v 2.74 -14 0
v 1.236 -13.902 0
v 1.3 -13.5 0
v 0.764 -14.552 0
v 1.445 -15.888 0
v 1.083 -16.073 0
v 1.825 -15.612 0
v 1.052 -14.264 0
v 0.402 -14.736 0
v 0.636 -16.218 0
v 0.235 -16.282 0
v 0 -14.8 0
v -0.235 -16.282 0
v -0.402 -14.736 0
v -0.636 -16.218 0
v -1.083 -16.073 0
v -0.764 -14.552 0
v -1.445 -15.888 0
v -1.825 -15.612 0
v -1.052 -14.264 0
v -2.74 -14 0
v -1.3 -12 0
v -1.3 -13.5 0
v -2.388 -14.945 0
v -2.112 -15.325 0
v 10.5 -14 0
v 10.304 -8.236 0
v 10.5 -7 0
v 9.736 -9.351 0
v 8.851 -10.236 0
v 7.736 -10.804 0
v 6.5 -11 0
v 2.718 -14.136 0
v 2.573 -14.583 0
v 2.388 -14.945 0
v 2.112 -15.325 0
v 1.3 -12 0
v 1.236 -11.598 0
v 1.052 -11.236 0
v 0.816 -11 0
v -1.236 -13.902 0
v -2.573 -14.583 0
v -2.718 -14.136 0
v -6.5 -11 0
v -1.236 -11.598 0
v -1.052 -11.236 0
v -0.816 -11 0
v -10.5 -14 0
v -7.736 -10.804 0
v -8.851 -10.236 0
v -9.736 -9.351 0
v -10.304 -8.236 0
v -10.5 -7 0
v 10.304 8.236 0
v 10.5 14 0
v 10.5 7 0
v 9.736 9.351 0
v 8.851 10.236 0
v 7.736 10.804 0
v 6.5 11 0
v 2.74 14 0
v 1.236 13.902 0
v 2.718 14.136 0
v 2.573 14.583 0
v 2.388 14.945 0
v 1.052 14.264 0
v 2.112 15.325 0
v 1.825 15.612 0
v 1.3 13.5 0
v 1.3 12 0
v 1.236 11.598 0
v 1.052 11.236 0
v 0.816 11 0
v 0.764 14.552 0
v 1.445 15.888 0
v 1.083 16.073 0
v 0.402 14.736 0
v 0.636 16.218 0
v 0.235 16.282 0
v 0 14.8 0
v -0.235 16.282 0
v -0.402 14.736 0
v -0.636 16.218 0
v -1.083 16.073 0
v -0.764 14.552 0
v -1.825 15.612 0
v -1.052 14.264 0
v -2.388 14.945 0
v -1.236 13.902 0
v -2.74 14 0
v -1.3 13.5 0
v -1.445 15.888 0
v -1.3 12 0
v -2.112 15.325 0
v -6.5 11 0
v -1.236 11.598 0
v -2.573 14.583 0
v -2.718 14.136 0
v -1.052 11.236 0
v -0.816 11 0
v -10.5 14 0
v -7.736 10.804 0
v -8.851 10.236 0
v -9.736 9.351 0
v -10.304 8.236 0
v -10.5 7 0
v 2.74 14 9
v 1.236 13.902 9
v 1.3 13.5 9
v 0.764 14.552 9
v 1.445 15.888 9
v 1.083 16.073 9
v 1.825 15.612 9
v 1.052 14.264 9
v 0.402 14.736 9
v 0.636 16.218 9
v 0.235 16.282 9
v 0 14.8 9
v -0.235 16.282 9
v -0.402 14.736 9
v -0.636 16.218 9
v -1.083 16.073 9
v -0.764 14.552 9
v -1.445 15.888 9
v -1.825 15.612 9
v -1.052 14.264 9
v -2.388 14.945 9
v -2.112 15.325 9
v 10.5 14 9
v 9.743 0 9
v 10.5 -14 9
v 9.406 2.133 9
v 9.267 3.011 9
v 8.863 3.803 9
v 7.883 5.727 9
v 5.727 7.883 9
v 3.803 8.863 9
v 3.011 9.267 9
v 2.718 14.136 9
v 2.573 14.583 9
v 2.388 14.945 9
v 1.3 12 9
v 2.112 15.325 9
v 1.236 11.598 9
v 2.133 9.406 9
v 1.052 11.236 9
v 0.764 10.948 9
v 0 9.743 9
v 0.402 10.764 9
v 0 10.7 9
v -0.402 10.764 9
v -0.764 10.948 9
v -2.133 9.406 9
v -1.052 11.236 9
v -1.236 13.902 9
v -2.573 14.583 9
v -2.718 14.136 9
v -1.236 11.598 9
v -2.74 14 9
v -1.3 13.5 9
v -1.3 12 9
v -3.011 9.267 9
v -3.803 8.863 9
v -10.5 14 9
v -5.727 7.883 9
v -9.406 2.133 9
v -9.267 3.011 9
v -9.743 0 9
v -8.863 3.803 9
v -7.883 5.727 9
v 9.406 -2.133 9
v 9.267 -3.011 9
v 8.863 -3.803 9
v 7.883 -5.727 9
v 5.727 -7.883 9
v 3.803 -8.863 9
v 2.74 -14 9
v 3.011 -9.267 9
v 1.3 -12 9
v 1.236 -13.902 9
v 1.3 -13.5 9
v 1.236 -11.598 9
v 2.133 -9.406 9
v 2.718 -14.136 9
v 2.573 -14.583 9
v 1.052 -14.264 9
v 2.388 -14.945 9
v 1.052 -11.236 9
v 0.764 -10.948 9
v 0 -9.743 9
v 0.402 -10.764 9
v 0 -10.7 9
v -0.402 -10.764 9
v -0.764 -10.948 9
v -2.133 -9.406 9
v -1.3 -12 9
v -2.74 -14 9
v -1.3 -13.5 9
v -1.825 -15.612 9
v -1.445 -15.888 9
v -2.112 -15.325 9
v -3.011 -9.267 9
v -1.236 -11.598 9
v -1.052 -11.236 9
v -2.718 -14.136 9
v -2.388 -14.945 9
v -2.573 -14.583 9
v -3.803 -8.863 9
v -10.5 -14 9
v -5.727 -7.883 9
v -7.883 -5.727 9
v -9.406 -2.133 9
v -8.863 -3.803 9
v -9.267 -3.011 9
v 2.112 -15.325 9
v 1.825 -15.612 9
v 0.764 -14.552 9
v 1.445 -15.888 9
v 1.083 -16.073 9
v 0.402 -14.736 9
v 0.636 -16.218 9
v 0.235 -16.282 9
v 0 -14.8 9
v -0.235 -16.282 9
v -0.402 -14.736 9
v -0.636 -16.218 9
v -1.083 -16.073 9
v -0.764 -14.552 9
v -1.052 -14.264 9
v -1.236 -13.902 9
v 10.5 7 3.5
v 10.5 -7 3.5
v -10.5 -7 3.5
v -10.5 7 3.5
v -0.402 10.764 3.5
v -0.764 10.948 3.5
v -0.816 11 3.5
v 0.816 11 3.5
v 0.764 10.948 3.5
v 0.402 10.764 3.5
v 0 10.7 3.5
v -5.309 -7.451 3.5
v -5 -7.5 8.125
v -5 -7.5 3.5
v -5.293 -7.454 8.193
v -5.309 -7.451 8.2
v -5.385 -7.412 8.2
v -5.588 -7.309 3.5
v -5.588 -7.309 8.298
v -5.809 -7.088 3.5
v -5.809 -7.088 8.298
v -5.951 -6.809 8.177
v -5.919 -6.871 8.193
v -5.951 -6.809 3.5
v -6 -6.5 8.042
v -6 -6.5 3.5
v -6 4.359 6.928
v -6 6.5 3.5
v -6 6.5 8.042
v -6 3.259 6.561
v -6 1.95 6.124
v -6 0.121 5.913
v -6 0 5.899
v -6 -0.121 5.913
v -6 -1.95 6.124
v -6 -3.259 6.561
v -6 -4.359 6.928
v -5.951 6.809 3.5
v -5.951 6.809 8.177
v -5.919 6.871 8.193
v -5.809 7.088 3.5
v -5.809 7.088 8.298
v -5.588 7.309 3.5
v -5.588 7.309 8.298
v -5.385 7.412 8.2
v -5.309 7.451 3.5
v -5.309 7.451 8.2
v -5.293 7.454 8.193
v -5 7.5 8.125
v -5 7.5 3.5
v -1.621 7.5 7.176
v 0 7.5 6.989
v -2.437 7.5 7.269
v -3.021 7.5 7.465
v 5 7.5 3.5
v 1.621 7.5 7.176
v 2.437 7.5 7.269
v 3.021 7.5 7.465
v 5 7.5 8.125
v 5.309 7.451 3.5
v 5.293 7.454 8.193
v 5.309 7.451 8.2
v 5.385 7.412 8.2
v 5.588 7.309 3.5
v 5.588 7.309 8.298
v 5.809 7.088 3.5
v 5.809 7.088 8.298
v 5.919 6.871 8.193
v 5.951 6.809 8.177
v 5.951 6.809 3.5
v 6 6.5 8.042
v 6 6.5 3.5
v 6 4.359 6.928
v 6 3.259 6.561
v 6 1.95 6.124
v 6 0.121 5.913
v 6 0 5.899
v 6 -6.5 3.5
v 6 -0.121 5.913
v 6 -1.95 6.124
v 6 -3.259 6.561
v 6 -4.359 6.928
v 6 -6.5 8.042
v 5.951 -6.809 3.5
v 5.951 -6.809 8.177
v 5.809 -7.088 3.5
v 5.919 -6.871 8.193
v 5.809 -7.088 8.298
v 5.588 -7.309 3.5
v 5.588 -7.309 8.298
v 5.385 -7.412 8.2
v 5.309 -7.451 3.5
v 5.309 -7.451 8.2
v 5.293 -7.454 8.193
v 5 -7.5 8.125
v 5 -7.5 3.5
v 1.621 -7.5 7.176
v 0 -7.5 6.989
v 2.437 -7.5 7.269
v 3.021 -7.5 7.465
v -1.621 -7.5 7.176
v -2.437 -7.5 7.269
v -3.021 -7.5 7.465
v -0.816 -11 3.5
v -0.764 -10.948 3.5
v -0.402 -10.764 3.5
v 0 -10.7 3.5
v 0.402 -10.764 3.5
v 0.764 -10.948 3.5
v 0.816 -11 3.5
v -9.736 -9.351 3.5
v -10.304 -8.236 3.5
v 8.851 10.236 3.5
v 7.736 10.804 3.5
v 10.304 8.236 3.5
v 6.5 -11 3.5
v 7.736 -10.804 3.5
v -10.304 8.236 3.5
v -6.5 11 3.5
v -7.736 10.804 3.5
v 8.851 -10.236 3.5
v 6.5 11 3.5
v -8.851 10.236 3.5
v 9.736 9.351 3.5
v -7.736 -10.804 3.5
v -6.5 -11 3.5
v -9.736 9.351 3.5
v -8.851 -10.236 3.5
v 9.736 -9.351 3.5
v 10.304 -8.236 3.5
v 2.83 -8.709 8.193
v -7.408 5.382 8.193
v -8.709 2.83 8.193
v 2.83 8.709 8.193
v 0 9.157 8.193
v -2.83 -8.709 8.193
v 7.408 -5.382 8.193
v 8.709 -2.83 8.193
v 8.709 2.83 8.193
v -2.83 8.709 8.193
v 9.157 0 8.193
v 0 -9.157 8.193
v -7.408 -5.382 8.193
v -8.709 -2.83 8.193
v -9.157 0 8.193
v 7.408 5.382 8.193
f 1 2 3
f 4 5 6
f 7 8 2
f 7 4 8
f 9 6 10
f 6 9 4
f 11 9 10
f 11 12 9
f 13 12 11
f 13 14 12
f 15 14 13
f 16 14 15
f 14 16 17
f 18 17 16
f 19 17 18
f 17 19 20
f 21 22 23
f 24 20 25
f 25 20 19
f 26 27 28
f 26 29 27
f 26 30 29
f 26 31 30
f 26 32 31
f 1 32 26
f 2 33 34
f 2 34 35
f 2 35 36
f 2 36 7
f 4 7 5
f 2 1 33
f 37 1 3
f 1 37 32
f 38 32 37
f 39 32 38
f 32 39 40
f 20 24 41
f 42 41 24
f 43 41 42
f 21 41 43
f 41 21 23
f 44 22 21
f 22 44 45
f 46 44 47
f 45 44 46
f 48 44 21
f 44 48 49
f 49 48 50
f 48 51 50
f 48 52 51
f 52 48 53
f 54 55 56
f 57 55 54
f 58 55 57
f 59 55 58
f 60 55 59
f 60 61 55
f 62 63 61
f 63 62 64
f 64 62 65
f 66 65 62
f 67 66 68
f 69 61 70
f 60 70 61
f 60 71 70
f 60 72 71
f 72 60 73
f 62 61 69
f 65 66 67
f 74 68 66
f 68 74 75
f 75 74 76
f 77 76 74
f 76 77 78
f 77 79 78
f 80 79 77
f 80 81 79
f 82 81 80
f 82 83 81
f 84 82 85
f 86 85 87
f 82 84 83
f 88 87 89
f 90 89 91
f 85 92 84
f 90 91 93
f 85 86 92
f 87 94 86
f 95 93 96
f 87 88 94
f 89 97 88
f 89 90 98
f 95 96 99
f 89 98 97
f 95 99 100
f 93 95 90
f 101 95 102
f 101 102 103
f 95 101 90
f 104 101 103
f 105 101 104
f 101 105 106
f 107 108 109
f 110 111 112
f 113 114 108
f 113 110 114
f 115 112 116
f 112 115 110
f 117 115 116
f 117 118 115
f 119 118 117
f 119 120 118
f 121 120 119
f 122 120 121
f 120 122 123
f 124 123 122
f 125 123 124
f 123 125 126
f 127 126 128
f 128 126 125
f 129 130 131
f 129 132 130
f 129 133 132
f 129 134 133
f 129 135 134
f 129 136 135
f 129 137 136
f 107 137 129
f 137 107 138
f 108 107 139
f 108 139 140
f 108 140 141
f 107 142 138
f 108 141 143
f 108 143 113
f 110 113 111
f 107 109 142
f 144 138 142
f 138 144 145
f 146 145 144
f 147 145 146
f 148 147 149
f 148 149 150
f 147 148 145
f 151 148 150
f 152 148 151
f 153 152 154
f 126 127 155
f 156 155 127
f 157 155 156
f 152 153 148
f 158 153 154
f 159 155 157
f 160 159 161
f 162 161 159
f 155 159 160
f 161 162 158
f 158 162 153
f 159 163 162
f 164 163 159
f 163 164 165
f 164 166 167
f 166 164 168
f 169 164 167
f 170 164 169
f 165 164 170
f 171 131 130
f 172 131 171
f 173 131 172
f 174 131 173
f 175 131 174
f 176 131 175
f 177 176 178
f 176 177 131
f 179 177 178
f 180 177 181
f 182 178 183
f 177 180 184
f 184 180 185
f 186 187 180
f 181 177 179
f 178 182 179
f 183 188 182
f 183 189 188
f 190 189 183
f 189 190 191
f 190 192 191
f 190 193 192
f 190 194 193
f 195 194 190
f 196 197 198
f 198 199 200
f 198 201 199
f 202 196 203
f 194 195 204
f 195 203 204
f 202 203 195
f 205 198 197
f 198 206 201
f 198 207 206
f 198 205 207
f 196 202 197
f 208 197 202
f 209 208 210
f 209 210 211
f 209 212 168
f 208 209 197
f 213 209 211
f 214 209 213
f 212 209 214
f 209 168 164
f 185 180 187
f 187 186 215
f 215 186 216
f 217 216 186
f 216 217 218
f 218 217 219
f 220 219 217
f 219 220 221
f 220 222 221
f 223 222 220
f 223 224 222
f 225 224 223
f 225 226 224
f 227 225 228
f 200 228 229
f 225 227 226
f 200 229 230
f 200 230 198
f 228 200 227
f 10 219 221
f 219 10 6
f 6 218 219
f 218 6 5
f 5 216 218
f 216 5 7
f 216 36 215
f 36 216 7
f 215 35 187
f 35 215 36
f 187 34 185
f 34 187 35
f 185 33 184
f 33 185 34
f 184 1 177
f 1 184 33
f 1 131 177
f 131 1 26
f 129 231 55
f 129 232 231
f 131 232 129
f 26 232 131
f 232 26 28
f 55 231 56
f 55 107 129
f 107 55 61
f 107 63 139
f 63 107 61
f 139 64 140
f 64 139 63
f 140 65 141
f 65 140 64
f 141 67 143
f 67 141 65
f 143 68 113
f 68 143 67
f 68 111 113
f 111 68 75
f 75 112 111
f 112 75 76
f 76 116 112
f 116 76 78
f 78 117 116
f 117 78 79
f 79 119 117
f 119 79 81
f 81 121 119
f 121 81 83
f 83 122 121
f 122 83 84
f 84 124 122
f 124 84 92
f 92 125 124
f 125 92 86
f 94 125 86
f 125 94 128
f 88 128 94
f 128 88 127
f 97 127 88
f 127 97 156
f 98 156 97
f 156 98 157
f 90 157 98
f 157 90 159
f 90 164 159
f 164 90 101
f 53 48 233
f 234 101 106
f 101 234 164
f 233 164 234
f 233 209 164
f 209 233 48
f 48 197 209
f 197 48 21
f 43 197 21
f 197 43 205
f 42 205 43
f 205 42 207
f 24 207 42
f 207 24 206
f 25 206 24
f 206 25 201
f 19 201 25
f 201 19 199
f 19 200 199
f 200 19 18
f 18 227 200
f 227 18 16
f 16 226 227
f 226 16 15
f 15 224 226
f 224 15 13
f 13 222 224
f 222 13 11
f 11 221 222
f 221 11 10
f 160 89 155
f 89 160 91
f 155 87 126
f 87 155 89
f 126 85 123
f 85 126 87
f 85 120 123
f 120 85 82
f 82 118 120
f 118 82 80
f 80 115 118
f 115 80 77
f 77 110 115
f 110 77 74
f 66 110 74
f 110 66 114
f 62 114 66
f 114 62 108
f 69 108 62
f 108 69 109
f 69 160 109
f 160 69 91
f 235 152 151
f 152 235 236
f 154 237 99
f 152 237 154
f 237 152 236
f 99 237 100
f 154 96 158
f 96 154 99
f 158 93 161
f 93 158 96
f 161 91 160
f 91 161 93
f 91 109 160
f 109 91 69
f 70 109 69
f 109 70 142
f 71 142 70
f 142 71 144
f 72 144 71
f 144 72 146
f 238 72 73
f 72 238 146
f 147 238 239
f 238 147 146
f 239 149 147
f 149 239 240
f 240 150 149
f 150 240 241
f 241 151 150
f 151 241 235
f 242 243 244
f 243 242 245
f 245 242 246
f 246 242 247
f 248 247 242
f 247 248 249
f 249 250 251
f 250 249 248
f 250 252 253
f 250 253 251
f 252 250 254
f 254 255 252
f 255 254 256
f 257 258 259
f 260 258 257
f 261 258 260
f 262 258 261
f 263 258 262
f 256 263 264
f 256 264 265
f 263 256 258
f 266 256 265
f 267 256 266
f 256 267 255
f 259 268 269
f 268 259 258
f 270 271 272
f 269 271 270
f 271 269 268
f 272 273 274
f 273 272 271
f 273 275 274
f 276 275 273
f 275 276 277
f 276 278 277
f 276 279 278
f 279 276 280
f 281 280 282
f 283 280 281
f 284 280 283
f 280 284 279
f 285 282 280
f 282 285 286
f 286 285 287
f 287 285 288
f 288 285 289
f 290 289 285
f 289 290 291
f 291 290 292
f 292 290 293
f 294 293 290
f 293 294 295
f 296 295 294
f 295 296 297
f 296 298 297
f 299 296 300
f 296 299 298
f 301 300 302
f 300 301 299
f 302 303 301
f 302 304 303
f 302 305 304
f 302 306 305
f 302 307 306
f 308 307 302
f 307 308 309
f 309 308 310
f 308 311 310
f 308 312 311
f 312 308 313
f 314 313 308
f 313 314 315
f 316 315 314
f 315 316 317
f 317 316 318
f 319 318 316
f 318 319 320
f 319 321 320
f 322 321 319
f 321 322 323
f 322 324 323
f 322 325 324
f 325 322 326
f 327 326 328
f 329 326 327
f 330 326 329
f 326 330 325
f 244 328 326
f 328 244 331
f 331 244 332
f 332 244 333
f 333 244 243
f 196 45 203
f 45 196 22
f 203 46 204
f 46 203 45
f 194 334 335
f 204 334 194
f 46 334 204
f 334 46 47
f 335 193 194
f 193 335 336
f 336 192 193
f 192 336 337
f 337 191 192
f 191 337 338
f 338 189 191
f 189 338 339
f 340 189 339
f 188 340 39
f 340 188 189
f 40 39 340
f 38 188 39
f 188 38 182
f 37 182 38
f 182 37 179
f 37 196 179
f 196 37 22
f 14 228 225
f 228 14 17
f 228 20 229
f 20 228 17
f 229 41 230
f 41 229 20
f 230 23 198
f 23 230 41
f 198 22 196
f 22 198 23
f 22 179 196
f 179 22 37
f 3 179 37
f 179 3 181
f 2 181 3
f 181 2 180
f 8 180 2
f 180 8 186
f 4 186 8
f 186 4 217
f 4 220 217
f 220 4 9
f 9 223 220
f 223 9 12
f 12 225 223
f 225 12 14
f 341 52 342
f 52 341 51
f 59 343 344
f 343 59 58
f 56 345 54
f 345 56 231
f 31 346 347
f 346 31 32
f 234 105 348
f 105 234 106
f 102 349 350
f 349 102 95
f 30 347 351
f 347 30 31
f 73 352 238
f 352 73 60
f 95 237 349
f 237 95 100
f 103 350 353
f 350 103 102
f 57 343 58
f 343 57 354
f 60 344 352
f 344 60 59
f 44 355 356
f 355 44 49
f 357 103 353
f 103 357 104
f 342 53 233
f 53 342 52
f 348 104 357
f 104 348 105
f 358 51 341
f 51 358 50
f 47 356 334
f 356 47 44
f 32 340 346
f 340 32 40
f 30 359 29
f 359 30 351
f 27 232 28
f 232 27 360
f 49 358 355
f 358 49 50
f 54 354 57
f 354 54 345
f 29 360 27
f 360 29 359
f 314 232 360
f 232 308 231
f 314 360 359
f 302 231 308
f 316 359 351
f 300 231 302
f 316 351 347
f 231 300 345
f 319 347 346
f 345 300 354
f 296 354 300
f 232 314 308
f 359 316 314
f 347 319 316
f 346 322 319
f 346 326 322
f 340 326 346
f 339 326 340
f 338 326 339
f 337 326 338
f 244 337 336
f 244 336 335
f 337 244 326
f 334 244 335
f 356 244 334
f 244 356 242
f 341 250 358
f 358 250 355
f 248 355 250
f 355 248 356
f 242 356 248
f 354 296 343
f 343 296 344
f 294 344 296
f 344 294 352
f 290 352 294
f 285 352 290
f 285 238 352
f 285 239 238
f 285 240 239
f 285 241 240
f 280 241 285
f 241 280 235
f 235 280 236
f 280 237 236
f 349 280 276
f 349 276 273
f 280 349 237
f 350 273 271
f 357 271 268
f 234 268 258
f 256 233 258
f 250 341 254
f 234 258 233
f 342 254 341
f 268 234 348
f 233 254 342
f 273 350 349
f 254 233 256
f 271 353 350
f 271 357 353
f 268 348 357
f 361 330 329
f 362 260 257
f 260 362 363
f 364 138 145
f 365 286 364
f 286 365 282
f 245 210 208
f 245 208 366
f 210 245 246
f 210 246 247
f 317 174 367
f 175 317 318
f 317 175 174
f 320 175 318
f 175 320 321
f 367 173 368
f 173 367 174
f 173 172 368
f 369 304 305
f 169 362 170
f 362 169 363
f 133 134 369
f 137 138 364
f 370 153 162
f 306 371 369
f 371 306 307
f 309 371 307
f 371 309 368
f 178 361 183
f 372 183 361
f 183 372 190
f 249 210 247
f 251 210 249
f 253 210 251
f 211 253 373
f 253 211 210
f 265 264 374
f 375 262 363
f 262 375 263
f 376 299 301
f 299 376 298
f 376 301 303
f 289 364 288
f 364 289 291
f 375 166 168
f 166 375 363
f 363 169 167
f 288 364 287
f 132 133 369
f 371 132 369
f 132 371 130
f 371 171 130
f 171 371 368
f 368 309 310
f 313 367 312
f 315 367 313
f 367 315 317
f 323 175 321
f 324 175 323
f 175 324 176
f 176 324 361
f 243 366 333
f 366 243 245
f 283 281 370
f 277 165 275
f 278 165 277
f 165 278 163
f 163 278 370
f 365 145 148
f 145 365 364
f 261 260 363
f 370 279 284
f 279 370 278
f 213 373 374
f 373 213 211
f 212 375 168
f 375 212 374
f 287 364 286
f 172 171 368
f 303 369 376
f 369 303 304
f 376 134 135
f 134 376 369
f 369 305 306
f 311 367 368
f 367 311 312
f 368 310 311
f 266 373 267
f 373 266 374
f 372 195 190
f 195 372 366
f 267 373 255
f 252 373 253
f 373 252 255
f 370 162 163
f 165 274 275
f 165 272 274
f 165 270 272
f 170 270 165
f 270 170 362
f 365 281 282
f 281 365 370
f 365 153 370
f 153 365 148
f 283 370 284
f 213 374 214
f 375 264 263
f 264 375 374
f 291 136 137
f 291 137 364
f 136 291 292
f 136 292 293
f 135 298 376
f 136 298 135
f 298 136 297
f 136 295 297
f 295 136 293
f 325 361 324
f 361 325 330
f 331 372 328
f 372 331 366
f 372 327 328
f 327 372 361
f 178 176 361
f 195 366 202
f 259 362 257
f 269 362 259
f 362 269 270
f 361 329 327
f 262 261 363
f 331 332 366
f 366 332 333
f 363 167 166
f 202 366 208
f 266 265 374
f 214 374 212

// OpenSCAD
// file: plate.scad
include <../config.scad>;

function getTrackballZ() = 
    -STANDOFF_HEIGHT +
    SENSOR_LENS_HEIGHT_ABOVE_BOARD +
    SENSOR_LENS_CLEARANCE +
    TRACKBALL_DIAMETER * 0.5;
    
function getTrackballHoleRadius() =
    sqrt(
        (TRACKBALL_DIAMETER * TRACKBALL_DIAMETER) / 4 -
        getTrackballZ() * getTrackballZ())
        + TRACKBALL_PLATE_CLEARANCE;

// draws a 2D circle representing a bolt hole
module boltHole(){
    circle(d = BOLT_DIAMETER + BOLT_TOLERENCE * 2);
}

// draws a 2D plate with the given key positions in 1U space
module plate(
    keyPositions = [],
    keyHeight = 1.0,
    boltPositions = [],
    cutHoles = true,
    hull = false){

    module solidPlate(){
        offset(delta = -PLATE_CURVE_RADIUS)
            for(keyPosition = keyPositions)
                translate([keyPosition.x, keyPosition.y * keyHeight] * 1U)

                    if(keyPosition.z == "adns" || keyPosition.z == "pmw")
                        translate([0.5, 0.5 * keyHeight] * 1U + [PLATE_BEZEL,PLATE_BEZEL])
                            offset(delta = TRACKBALL_PLATE_BEZEL)
                                circle(r = getTrackballHoleRadius());

                    else
                        square([1, keyHeight] * 1U + [1, 1] * PLATE_BEZEL * 2);
    }

    difference(){
        
        // outline
        minkowski() {
            if(hull)
                hull()
                    solidPlate();
            else
                solidPlate();
            
            circle(r = PLATE_CURVE_RADIUS);
        }
        
        // cutouts
        translate([PLATE_BEZEL, PLATE_BEZEL]){

            if(cutHoles){
                for(keyPosition = keyPositions)
                    translate([keyPosition.x + 0.5, (keyPosition.y + 0.5) * keyHeight] * 1U)

                    if(keyPosition.z == "adns" || keyPosition.z == "pmw")
                        circle(r = getTrackballHoleRadius());
                    else
                        translate(-[SWITCH_WIDTH, SWITCH_WIDTH] * 0.5)
                            square([SWITCH_WIDTH,SWITCH_WIDTH]);                        

                for(keyPosition = keyPositions){
                    translate([keyPosition.x + 0.5, (keyPosition.y + 0.5) * keyHeight] * 1U){
                        if(keyPosition.z == "adns" || keyPosition.z == "pmw"){
                            translate([0, SENSOR_PCB_MOUNT_OFFSET, 0])
                                boltHole();
                            translate([0, -SENSOR_PCB_MOUNT_OFFSET, 0])
                                boltHole();
                        }
                    }
                }

                for(boltPosition = boltPositions)
                    translate([boltPosition.x, boltPosition.y * keyHeight] * 1U)
                        boltHole();
            }
        }
    }
}

plate(
    keyPositions = FINGER_GRID,
    keyHeight = 1.0,
    boltPositions = FINGER_BOLT_HOLES,
    cutHoles = true,
    $fn = 100);
// file: shapes.scad
// draws a square with rounded corners
module squircle(
    size = [1,1],
    radius = 1,
    center = false){
    
    x = size[0];
    y = size[1];
    radius = min(x/2,min(y/2, radius));
    translation = [0,0];
        
    module corner(){
            intersection(){
                square([radius,radius]);
                translate([radius, radius])
                    circle(radius);
            }
    }
    
    module body(){
    
        corner();
        
        translate([0, y])        
            rotate([0,0,-90])
                corner();
        
        translate([x, y])        
            rotate([0,0,180])
                corner();
        
        translate([x, 0])        
            rotate([0,0, 90])
                corner();
        
        translate([radius, 0])
            square([x - 2 * radius, radius]);
        
        translate([0, radius])
            square([x, y - radius * 2]);
            
        translate([radius, y - radius])
            square([x - 2 * radius, radius]);
    }
    
    if(center)
        translate([-x/2, -y/2])
            body();
    else
        body();
}
// file: ../config.scad
// draw flags

DRAW_DEBUG = false;

// MX constants

1U = 19.05;
SWITCH_WIDTH = 14;

// hardware

NUT_DIAMETER = 4;
NUT_HEIGHT = 3;
NUT_TOLERENCE = 0.5;
BOLT_DIAMETER = 2.4; // M2 cleanance
BOLT_TOLERENCE = 0.1;
BOLT_TOP_DIAMETER = 3.8;
BOLT_TOP_HEIGHT = 2.5;
BOLT_LENGTH = 18;
THUMB_BOLT_LENGTH = 22;

BEARING_DIAMETER = 3.175;
BEARING_TOLERENCE = 0.05;

// plate

PLATE_THICKNESS = 1.5;
PLATE_BEZEL = 1;
PLATE_CURVE_RADIUS = 1;

// trackball

TRACKBALL_BOLT_HOLES_DIAMETER = 32;
TRACKBALL_DIAMETER = 24.9;
TRACKBALL_PLATE_CLEARANCE = 1.5;
TRACKBALL_PLATE_BEZEL = 7;
TRACKBALL_BEARING_MOUNT_CLEARANCE = 1.8;

// common sensor

SENSOR_CHANNEL_WIDTH = 12;
SENSOR_CHANNEL_HEIGHT = 15;
SENSOR_LENS_CLEARANCE = 1.4; // 2.4 from ADNS9800/PMW3600 data sheets, but needed a slight reduction, probably due to print tolerences
SENSOR_LENS_HEIGHT_ABOVE_BOARD = 3.5;
SENSOR_LENS_WIDTH = 21; 
SENSOR_LENS_HEIGHT = 22;
SENSOR_PCB_MOUNT_OFFSET = 13.5; // distance in X/Y from centre
SENSOR_PCB_THICKNESS = 1.5;
SENSOR_PCB_UNDERSIDE_CLEARANCE = 21.5;
SENDOR_TRACKBALL_CLEARANCE = 1;
STANDOFF_HEIGHT = 9;

// ADNS9800 sensor

ADNS_PCB_DIAMETER = 32;

// PMW3360 sensor

PMW_PCB_WIDTH = 21;
PMW_PCB_HEIGHT = 28;
PMW_PCB_MOUNT_OFFSET = 12;

// bearing mount

BEARING_OFFSET_Z = 3.8;
BEARING_MOUNT_TOP_CURVE_RADIUS = 1.2;
BEARING_MOUNT_TOP_X_MAX = 5;
BEARING_MOUNT_HEIGHT = 10;
BEARING_MOUNT_BOLT_TOP_CLEARANCE = 1.5;
BEARING_BOLT_CLEARANCE_Z = 1;

// PCB

MX_PCB_OFFSET = 5;
PCB_CURVE_RADIUS = 2;
PCB_PLATE_OFFSET_Z = MX_PCB_OFFSET - PLATE_THICKNESS;
PCB_THICKNESS = 1.6;
PCB_UNDERSIDE_CLEARANCE = 7;
PCB_CASE_CLEARANCE = 1;
PCB_SWITCH_OFFSET = 0;

PRO_MICRO_SIZE = [17.8, 33];
PRO_MICRO_USB_OVERHANG = 2;

MCU_PCB_OFFSET = 3.5; // socket or header height
MCU_PCB_THICKNESS = 1; // Elite C

// case

CASE_PLATE_BEZEL = 1;
CASE_PLATE_TOLERENCE = 0.25;
CASE_CURVE_RADIUS = 1;
CASE_PLATE_MOUNT_COVERAGE = 1;
CASE_BOLT_HOUSING_WIDTH = 1.5;
CASE_BOTTOM_THICKNESS = 2;
CASE_HEIGHT_ABOVE_PLATE = 0;
CASE_STANDOFF_FLANGED = true;

// case feet cutouts

FEET_DIAMETER = 8;
FEET_TOLERENCE = 1.25;
FEET_HEIGHT = 1;

// layouts in 1U space

FINGER_GRID = 
    [[0, 2], [1, 2], [2, 2.25], [3, 2.37], [4, 2.25], [5, 2.12],
     [0, 1], [1, 1], [2, 1.25], [3, 1.37], [4, 1.25], [5, 1.12],
     [0, 0], [1, 0], [2, 0.25], [3, 0.37], [4, 0.25], [5, 0.12]];

FINGER_BOLT_HOLES =
    [[1, 2], [5, 2.185],
     [1, 1], [5, 1.185]];

THUMB_GRID = [[0, 0], [1, 0.1]];

THUMB_BOLT_HOLES = 
    [[0.95, 0.925],
     [1.05, 0.175]];

THUMB_TRACKBALL_GRID = [[0, 0], [1.43, 0, "pmw" /* "adns" */ ]];

THUMB_TRACKBALL_BOLT_HOLES = 
    [[0.95, 0.925],
     [0.95, 0.075]];

FEET_POSITIONS =
    [[0.3, 2.75], [5.6, 2.85],
     [0.3, 0.3], [5.95, -1.1]];

THUMB_FEET_POSITIONS =
    [[0.3, 2.75], [5.6, 2.85],
     [0.3, 0.3], [6.45, -1.25]];

// plane rotations

HAND_ROTATION = [5, -8.5, 0];
THUMB_ROTATION = [10, -2, -10.25];
THUMB_OFFSET = [80.5, -22, 8.5];

// cutouts

USB_C_SIZE = [8.98, 9.20, 3.28];
USB_C_CUTOUT_TOLERENCE = 0.5;
USB_C_CUTOUT_OUTER_DELTA = 1.5;

TRRS_CUTOUT_SIZE = 5.5;
TRRS_CUTOUT_OUTER_DELTA = 5.5;
// main file
include <../config.scad>;
use <../modules/shapes.scad>;
use <../modules/plate.scad>;

module pmwCover(){

    module boltHoles(){

        boltCutout = BOLT_DIAMETER + BOLT_TOLERENCE * 2;
        cutoutLength = SENSOR_PCB_MOUNT_OFFSET - PMW_PCB_MOUNT_OFFSET + boltCutout;

        translate([0, PMW_PCB_MOUNT_OFFSET + (cutoutLength - boltCutout ) / 2])
            squircle([boltCutout, cutoutLength], boltCutout, true);

        translate([0, -PMW_PCB_MOUNT_OFFSET - (cutoutLength - boltCutout) / 2])
            squircle([boltCutout, cutoutLength], boltCutout, true);
    }

    difference(){
        linear_extrude(STANDOFF_HEIGHT)
            difference(){

                union(){
                    square([PMW_PCB_WIDTH, PMW_PCB_HEIGHT], center = true);
                    offset(1.5)
                        boltHoles();
                }

                boltHoles();

                // laser channel
                squircle(
                    size = [SENSOR_CHANNEL_WIDTH, SENSOR_CHANNEL_HEIGHT],
                    radius = 1,
                    center = true);
            }
        
        // cutout for sensor
        linear_extrude(SENSOR_LENS_HEIGHT_ABOVE_BOARD)
            squircle(
                size = [SENSOR_LENS_WIDTH, SENSOR_LENS_HEIGHT],
                radius = 4,
                center = true);
                
        // cutout for trackball
        translate([0, 0, getTrackballZ() + STANDOFF_HEIGHT])
            sphere(d = TRACKBALL_DIAMETER + SENDOR_TRACKBALL_CLEARANCE);
    }
}

pmwCover($fn = 20);
